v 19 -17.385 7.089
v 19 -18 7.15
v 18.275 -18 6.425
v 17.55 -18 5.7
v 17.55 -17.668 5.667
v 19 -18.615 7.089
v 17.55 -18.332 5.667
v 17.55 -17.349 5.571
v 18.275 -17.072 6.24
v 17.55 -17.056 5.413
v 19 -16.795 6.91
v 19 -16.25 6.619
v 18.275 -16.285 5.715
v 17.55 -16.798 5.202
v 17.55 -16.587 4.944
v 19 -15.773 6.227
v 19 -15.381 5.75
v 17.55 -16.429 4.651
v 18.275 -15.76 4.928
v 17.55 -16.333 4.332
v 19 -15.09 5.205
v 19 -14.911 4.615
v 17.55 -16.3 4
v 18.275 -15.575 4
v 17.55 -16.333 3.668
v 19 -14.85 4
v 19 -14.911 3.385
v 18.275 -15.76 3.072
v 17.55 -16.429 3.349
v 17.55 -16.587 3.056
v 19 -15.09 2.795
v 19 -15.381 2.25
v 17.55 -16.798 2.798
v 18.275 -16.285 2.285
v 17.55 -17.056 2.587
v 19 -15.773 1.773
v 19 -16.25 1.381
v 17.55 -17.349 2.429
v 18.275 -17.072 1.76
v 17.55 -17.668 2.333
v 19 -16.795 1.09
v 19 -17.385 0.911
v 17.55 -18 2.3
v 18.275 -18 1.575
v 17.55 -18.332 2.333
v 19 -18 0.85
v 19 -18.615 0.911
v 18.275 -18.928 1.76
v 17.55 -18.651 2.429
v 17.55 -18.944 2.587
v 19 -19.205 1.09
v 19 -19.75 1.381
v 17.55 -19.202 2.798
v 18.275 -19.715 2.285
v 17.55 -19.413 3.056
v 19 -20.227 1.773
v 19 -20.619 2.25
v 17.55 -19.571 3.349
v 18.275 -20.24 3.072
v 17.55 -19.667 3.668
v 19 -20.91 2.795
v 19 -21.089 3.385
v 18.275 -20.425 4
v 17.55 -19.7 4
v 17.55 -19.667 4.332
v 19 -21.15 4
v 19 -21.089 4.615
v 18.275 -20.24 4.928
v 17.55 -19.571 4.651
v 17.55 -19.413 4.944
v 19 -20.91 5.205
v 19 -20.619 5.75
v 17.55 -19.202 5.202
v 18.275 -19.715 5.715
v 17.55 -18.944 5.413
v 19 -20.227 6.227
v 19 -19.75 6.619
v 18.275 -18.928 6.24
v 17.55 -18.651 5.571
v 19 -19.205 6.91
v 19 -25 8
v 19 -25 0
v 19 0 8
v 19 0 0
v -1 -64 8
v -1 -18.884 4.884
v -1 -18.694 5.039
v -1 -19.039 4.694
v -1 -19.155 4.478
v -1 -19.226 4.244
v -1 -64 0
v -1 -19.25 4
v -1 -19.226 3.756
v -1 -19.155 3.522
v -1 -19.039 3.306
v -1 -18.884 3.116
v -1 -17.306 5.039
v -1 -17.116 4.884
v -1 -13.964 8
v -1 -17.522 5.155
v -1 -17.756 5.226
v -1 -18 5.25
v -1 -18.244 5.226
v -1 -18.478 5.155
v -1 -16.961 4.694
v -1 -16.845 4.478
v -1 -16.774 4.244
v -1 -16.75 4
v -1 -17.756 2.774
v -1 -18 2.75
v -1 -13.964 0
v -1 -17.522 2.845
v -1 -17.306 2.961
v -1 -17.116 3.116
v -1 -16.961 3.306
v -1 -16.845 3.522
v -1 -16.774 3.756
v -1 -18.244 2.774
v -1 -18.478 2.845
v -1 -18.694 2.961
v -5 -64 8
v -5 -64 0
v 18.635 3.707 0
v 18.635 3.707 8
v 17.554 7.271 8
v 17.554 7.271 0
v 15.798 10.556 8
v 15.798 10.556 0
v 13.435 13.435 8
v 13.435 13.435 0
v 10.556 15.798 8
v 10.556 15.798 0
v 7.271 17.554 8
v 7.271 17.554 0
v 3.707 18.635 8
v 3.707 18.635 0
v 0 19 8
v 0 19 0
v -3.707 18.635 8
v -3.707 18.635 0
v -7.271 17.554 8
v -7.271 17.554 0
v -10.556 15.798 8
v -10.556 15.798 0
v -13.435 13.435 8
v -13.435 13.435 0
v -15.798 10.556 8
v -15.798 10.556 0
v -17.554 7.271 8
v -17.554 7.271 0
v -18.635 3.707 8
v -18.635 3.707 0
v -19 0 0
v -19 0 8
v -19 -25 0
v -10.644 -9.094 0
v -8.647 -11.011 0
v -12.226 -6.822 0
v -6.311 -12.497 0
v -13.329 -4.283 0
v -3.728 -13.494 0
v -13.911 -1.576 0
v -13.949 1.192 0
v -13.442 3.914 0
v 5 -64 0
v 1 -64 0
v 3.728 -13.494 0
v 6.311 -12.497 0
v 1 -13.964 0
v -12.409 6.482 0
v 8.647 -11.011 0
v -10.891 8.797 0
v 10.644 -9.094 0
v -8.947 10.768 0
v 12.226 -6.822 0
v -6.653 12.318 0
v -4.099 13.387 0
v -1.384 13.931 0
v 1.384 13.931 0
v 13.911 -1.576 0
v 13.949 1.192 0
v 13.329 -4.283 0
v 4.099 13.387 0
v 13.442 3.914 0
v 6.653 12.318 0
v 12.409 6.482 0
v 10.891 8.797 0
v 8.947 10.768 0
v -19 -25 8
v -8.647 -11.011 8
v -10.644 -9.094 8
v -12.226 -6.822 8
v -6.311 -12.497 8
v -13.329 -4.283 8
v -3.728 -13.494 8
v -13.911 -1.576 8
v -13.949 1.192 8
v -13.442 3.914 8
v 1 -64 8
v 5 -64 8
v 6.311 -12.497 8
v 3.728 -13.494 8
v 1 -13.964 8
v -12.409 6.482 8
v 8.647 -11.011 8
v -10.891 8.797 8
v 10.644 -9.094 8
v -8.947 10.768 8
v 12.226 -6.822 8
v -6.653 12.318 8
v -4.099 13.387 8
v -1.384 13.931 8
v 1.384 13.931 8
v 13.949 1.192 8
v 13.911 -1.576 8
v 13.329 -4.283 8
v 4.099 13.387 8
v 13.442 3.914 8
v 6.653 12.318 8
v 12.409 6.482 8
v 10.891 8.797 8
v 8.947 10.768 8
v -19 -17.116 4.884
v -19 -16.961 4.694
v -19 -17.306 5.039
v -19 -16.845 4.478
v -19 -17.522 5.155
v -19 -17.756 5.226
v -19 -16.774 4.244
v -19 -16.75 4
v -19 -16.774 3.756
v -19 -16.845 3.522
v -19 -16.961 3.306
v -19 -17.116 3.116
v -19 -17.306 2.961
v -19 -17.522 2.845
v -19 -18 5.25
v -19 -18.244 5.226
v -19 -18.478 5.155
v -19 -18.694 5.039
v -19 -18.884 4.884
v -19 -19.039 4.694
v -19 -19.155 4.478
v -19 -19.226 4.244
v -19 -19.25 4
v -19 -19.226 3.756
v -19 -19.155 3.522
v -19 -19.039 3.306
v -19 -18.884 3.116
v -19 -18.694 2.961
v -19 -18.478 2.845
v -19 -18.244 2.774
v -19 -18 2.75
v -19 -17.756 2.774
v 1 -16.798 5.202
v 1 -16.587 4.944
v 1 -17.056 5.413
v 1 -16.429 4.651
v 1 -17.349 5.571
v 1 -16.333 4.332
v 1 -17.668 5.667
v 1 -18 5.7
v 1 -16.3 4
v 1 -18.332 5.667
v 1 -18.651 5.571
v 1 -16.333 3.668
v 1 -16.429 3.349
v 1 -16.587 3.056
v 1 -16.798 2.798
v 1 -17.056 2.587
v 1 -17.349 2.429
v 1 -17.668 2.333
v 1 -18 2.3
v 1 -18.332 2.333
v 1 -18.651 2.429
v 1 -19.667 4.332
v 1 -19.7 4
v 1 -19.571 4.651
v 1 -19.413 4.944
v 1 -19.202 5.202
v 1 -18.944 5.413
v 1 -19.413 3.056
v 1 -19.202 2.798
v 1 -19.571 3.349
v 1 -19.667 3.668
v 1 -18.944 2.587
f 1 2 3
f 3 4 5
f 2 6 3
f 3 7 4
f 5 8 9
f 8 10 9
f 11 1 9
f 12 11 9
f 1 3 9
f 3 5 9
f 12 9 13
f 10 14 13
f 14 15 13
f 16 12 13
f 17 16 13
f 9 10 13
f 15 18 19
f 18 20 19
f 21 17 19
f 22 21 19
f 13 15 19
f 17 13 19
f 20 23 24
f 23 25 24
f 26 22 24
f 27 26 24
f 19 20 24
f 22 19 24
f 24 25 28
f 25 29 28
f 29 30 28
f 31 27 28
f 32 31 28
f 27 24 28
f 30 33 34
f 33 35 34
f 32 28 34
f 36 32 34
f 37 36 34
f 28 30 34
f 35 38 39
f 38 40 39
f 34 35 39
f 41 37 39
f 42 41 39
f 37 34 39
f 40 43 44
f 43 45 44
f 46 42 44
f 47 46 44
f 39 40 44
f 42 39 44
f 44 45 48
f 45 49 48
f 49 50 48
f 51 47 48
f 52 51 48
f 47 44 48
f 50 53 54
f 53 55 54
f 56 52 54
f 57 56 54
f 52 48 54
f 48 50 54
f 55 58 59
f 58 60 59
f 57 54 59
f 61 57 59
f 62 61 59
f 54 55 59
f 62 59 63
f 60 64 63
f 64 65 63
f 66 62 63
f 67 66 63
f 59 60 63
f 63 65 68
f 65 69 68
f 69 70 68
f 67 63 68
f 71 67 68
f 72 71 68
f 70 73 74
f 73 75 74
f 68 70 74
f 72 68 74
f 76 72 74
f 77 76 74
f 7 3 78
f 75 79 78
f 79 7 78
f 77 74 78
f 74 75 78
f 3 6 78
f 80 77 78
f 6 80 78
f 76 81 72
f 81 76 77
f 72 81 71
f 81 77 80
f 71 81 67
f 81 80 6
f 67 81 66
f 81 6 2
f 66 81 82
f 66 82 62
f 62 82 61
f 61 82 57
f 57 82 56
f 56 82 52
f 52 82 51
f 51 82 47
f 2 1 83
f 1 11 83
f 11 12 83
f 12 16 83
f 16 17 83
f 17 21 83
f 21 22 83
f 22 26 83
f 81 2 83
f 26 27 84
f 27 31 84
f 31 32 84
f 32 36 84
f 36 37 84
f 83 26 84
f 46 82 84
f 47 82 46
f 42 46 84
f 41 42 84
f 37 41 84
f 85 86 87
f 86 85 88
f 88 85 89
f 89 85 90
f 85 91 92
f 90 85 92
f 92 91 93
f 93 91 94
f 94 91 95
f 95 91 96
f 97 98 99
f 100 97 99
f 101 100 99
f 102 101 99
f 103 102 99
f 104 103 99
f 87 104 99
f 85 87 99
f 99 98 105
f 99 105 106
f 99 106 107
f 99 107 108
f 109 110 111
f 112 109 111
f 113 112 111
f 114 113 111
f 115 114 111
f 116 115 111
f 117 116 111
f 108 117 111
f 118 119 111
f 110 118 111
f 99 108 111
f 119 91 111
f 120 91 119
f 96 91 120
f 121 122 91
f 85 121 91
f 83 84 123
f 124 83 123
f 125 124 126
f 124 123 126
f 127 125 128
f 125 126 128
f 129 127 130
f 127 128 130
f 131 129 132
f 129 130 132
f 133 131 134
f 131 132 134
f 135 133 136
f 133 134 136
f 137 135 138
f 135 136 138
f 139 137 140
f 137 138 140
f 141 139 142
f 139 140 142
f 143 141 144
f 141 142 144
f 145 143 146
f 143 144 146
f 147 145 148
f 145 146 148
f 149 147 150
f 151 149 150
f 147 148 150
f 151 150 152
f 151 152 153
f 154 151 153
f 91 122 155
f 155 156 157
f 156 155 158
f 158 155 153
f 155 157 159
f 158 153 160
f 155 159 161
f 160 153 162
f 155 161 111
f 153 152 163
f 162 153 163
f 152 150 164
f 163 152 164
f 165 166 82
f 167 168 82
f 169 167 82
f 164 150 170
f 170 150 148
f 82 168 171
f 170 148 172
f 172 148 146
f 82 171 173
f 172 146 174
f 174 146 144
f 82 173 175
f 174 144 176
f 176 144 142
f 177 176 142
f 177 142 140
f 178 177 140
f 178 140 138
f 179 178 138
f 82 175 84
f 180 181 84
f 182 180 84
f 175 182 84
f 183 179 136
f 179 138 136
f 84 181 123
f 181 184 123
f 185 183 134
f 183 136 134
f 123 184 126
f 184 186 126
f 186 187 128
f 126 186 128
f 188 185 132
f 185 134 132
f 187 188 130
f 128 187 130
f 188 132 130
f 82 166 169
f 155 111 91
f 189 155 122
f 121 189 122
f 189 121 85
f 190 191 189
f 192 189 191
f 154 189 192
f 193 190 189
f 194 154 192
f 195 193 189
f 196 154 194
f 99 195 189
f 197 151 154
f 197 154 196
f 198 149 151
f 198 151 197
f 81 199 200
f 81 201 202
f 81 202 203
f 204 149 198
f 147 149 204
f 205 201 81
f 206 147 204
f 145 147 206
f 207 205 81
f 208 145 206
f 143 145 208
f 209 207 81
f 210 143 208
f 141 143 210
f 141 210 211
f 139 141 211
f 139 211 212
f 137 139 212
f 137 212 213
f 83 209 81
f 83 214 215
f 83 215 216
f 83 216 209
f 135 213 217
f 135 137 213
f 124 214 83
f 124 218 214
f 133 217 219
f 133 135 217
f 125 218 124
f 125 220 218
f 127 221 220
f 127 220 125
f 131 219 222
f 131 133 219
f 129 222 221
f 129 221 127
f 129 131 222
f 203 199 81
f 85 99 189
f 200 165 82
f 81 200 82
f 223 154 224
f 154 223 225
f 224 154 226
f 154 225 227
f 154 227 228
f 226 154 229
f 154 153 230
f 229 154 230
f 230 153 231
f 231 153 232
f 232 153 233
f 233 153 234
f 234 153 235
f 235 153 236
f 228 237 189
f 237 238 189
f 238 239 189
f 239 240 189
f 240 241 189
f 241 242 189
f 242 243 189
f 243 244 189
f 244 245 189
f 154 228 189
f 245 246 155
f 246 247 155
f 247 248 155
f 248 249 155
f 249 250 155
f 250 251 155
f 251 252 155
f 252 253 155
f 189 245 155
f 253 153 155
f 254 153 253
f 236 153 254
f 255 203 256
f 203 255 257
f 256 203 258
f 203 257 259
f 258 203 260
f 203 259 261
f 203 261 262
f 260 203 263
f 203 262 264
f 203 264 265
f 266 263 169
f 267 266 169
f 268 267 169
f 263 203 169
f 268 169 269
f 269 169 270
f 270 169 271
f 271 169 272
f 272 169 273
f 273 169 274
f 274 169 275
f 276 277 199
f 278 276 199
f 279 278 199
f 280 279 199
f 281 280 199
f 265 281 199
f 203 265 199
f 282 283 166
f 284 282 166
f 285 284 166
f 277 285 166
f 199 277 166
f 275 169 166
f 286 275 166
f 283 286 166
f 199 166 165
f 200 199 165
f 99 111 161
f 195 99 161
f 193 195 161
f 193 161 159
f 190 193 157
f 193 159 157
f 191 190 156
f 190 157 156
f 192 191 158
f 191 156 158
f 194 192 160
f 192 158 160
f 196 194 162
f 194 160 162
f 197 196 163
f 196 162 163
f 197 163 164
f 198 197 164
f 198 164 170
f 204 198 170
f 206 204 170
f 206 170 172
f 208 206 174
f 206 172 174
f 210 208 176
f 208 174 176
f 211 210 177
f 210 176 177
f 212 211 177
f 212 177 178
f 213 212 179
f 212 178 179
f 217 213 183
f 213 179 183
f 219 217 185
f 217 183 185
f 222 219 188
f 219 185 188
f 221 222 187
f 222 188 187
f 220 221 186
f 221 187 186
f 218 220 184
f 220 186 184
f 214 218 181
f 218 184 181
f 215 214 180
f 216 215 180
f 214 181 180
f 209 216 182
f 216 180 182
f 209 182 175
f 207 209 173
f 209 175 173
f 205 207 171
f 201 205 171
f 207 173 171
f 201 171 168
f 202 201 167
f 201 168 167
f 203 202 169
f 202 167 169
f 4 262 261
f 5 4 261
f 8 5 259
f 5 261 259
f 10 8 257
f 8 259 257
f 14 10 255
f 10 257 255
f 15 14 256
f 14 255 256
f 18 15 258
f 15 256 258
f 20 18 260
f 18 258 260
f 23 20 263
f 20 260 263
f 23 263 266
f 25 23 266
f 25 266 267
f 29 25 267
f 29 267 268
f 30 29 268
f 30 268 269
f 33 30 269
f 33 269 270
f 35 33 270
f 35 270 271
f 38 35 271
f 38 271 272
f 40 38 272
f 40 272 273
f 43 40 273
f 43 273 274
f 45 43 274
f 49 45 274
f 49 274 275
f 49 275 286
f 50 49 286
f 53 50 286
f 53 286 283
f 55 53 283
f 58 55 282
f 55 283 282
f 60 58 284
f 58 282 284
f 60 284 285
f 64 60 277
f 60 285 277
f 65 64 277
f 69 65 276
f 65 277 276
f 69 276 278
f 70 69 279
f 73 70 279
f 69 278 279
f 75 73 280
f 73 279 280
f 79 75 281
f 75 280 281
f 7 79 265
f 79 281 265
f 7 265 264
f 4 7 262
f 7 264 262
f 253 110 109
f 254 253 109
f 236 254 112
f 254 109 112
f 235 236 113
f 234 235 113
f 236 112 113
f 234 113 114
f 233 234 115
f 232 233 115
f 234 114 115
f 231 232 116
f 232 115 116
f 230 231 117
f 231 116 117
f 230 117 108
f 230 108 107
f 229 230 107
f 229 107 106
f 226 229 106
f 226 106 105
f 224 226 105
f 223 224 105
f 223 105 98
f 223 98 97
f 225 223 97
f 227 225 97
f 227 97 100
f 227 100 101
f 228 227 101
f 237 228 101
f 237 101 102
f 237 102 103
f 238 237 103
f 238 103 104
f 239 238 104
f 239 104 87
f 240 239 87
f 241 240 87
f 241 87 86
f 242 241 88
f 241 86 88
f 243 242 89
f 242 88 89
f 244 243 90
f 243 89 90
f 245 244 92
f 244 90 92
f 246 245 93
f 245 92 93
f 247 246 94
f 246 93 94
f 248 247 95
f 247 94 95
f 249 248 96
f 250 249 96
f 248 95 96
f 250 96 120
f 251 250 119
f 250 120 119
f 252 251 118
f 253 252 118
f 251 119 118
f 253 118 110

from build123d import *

# Parameters (mm, degrees)
EXTRUDE_1_DEPTH              = 8
HOLE_WIZARD_M3_1_D           = 3.4
HOLE_WIZARD_M3_1_DEPTH       = 18
HOLE_WIZARD_M3_1_CSINK_D     = 6.3
HOLE_WIZARD_M3_1_CSINK_ANGLE = 90
HOLE_WIZARD_M3_1_2_D         = 2.5
HOLE_WIZARD_M3_1_2_DEPTH     = 18


with BuildPart() as part:
    # 스케치1 → 보스-돌출1 (new body)
    with BuildSketch(Plane.XY):
        with BuildLine():
            Line((1, -13.964240044), (1, -64))
            Line((1, -64), (5, -64))
            Line((5, -64), (19, -25))
            Line((19, -25), (19, 0))
            ThreePointArc((19, 0), (0, 19), (-19, 0))
            Line((-19, 0), (-19, -25))
            Line((-19, -25), (-5, -64))
            Line((-5, -64), (-1, -64))
            Line((-1, -64), (-1, -13.964240044))
            ThreePointArc((-1, -13.964240044), (0, 14), (1, -13.964240044))
        make_face()
    extrude(amount=EXTRUDE_1_DEPTH)

    # Hole Wizard M3 _ _ _ _1
    with Locations(Plane(origin=(19, 0, 0), x_dir=(0, 0, -1), z_dir=(1, 0, 0))):
        with Locations((-4, -18)):
            CounterSinkHole(HOLE_WIZARD_M3_1_D / 2, HOLE_WIZARD_M3_1_CSINK_D / 2, depth=HOLE_WIZARD_M3_1_DEPTH, counter_sink_angle=HOLE_WIZARD_M3_1_CSINK_ANGLE)

    # Hole Wizard M3 _ _1 2
    with Locations(Plane.ZY.offset(19)):
        with Locations((4, -18)):
            Hole(HOLE_WIZARD_M3_1_2_D / 2, depth=HOLE_WIZARD_M3_1_2_DEPTH)


solid = part.part
